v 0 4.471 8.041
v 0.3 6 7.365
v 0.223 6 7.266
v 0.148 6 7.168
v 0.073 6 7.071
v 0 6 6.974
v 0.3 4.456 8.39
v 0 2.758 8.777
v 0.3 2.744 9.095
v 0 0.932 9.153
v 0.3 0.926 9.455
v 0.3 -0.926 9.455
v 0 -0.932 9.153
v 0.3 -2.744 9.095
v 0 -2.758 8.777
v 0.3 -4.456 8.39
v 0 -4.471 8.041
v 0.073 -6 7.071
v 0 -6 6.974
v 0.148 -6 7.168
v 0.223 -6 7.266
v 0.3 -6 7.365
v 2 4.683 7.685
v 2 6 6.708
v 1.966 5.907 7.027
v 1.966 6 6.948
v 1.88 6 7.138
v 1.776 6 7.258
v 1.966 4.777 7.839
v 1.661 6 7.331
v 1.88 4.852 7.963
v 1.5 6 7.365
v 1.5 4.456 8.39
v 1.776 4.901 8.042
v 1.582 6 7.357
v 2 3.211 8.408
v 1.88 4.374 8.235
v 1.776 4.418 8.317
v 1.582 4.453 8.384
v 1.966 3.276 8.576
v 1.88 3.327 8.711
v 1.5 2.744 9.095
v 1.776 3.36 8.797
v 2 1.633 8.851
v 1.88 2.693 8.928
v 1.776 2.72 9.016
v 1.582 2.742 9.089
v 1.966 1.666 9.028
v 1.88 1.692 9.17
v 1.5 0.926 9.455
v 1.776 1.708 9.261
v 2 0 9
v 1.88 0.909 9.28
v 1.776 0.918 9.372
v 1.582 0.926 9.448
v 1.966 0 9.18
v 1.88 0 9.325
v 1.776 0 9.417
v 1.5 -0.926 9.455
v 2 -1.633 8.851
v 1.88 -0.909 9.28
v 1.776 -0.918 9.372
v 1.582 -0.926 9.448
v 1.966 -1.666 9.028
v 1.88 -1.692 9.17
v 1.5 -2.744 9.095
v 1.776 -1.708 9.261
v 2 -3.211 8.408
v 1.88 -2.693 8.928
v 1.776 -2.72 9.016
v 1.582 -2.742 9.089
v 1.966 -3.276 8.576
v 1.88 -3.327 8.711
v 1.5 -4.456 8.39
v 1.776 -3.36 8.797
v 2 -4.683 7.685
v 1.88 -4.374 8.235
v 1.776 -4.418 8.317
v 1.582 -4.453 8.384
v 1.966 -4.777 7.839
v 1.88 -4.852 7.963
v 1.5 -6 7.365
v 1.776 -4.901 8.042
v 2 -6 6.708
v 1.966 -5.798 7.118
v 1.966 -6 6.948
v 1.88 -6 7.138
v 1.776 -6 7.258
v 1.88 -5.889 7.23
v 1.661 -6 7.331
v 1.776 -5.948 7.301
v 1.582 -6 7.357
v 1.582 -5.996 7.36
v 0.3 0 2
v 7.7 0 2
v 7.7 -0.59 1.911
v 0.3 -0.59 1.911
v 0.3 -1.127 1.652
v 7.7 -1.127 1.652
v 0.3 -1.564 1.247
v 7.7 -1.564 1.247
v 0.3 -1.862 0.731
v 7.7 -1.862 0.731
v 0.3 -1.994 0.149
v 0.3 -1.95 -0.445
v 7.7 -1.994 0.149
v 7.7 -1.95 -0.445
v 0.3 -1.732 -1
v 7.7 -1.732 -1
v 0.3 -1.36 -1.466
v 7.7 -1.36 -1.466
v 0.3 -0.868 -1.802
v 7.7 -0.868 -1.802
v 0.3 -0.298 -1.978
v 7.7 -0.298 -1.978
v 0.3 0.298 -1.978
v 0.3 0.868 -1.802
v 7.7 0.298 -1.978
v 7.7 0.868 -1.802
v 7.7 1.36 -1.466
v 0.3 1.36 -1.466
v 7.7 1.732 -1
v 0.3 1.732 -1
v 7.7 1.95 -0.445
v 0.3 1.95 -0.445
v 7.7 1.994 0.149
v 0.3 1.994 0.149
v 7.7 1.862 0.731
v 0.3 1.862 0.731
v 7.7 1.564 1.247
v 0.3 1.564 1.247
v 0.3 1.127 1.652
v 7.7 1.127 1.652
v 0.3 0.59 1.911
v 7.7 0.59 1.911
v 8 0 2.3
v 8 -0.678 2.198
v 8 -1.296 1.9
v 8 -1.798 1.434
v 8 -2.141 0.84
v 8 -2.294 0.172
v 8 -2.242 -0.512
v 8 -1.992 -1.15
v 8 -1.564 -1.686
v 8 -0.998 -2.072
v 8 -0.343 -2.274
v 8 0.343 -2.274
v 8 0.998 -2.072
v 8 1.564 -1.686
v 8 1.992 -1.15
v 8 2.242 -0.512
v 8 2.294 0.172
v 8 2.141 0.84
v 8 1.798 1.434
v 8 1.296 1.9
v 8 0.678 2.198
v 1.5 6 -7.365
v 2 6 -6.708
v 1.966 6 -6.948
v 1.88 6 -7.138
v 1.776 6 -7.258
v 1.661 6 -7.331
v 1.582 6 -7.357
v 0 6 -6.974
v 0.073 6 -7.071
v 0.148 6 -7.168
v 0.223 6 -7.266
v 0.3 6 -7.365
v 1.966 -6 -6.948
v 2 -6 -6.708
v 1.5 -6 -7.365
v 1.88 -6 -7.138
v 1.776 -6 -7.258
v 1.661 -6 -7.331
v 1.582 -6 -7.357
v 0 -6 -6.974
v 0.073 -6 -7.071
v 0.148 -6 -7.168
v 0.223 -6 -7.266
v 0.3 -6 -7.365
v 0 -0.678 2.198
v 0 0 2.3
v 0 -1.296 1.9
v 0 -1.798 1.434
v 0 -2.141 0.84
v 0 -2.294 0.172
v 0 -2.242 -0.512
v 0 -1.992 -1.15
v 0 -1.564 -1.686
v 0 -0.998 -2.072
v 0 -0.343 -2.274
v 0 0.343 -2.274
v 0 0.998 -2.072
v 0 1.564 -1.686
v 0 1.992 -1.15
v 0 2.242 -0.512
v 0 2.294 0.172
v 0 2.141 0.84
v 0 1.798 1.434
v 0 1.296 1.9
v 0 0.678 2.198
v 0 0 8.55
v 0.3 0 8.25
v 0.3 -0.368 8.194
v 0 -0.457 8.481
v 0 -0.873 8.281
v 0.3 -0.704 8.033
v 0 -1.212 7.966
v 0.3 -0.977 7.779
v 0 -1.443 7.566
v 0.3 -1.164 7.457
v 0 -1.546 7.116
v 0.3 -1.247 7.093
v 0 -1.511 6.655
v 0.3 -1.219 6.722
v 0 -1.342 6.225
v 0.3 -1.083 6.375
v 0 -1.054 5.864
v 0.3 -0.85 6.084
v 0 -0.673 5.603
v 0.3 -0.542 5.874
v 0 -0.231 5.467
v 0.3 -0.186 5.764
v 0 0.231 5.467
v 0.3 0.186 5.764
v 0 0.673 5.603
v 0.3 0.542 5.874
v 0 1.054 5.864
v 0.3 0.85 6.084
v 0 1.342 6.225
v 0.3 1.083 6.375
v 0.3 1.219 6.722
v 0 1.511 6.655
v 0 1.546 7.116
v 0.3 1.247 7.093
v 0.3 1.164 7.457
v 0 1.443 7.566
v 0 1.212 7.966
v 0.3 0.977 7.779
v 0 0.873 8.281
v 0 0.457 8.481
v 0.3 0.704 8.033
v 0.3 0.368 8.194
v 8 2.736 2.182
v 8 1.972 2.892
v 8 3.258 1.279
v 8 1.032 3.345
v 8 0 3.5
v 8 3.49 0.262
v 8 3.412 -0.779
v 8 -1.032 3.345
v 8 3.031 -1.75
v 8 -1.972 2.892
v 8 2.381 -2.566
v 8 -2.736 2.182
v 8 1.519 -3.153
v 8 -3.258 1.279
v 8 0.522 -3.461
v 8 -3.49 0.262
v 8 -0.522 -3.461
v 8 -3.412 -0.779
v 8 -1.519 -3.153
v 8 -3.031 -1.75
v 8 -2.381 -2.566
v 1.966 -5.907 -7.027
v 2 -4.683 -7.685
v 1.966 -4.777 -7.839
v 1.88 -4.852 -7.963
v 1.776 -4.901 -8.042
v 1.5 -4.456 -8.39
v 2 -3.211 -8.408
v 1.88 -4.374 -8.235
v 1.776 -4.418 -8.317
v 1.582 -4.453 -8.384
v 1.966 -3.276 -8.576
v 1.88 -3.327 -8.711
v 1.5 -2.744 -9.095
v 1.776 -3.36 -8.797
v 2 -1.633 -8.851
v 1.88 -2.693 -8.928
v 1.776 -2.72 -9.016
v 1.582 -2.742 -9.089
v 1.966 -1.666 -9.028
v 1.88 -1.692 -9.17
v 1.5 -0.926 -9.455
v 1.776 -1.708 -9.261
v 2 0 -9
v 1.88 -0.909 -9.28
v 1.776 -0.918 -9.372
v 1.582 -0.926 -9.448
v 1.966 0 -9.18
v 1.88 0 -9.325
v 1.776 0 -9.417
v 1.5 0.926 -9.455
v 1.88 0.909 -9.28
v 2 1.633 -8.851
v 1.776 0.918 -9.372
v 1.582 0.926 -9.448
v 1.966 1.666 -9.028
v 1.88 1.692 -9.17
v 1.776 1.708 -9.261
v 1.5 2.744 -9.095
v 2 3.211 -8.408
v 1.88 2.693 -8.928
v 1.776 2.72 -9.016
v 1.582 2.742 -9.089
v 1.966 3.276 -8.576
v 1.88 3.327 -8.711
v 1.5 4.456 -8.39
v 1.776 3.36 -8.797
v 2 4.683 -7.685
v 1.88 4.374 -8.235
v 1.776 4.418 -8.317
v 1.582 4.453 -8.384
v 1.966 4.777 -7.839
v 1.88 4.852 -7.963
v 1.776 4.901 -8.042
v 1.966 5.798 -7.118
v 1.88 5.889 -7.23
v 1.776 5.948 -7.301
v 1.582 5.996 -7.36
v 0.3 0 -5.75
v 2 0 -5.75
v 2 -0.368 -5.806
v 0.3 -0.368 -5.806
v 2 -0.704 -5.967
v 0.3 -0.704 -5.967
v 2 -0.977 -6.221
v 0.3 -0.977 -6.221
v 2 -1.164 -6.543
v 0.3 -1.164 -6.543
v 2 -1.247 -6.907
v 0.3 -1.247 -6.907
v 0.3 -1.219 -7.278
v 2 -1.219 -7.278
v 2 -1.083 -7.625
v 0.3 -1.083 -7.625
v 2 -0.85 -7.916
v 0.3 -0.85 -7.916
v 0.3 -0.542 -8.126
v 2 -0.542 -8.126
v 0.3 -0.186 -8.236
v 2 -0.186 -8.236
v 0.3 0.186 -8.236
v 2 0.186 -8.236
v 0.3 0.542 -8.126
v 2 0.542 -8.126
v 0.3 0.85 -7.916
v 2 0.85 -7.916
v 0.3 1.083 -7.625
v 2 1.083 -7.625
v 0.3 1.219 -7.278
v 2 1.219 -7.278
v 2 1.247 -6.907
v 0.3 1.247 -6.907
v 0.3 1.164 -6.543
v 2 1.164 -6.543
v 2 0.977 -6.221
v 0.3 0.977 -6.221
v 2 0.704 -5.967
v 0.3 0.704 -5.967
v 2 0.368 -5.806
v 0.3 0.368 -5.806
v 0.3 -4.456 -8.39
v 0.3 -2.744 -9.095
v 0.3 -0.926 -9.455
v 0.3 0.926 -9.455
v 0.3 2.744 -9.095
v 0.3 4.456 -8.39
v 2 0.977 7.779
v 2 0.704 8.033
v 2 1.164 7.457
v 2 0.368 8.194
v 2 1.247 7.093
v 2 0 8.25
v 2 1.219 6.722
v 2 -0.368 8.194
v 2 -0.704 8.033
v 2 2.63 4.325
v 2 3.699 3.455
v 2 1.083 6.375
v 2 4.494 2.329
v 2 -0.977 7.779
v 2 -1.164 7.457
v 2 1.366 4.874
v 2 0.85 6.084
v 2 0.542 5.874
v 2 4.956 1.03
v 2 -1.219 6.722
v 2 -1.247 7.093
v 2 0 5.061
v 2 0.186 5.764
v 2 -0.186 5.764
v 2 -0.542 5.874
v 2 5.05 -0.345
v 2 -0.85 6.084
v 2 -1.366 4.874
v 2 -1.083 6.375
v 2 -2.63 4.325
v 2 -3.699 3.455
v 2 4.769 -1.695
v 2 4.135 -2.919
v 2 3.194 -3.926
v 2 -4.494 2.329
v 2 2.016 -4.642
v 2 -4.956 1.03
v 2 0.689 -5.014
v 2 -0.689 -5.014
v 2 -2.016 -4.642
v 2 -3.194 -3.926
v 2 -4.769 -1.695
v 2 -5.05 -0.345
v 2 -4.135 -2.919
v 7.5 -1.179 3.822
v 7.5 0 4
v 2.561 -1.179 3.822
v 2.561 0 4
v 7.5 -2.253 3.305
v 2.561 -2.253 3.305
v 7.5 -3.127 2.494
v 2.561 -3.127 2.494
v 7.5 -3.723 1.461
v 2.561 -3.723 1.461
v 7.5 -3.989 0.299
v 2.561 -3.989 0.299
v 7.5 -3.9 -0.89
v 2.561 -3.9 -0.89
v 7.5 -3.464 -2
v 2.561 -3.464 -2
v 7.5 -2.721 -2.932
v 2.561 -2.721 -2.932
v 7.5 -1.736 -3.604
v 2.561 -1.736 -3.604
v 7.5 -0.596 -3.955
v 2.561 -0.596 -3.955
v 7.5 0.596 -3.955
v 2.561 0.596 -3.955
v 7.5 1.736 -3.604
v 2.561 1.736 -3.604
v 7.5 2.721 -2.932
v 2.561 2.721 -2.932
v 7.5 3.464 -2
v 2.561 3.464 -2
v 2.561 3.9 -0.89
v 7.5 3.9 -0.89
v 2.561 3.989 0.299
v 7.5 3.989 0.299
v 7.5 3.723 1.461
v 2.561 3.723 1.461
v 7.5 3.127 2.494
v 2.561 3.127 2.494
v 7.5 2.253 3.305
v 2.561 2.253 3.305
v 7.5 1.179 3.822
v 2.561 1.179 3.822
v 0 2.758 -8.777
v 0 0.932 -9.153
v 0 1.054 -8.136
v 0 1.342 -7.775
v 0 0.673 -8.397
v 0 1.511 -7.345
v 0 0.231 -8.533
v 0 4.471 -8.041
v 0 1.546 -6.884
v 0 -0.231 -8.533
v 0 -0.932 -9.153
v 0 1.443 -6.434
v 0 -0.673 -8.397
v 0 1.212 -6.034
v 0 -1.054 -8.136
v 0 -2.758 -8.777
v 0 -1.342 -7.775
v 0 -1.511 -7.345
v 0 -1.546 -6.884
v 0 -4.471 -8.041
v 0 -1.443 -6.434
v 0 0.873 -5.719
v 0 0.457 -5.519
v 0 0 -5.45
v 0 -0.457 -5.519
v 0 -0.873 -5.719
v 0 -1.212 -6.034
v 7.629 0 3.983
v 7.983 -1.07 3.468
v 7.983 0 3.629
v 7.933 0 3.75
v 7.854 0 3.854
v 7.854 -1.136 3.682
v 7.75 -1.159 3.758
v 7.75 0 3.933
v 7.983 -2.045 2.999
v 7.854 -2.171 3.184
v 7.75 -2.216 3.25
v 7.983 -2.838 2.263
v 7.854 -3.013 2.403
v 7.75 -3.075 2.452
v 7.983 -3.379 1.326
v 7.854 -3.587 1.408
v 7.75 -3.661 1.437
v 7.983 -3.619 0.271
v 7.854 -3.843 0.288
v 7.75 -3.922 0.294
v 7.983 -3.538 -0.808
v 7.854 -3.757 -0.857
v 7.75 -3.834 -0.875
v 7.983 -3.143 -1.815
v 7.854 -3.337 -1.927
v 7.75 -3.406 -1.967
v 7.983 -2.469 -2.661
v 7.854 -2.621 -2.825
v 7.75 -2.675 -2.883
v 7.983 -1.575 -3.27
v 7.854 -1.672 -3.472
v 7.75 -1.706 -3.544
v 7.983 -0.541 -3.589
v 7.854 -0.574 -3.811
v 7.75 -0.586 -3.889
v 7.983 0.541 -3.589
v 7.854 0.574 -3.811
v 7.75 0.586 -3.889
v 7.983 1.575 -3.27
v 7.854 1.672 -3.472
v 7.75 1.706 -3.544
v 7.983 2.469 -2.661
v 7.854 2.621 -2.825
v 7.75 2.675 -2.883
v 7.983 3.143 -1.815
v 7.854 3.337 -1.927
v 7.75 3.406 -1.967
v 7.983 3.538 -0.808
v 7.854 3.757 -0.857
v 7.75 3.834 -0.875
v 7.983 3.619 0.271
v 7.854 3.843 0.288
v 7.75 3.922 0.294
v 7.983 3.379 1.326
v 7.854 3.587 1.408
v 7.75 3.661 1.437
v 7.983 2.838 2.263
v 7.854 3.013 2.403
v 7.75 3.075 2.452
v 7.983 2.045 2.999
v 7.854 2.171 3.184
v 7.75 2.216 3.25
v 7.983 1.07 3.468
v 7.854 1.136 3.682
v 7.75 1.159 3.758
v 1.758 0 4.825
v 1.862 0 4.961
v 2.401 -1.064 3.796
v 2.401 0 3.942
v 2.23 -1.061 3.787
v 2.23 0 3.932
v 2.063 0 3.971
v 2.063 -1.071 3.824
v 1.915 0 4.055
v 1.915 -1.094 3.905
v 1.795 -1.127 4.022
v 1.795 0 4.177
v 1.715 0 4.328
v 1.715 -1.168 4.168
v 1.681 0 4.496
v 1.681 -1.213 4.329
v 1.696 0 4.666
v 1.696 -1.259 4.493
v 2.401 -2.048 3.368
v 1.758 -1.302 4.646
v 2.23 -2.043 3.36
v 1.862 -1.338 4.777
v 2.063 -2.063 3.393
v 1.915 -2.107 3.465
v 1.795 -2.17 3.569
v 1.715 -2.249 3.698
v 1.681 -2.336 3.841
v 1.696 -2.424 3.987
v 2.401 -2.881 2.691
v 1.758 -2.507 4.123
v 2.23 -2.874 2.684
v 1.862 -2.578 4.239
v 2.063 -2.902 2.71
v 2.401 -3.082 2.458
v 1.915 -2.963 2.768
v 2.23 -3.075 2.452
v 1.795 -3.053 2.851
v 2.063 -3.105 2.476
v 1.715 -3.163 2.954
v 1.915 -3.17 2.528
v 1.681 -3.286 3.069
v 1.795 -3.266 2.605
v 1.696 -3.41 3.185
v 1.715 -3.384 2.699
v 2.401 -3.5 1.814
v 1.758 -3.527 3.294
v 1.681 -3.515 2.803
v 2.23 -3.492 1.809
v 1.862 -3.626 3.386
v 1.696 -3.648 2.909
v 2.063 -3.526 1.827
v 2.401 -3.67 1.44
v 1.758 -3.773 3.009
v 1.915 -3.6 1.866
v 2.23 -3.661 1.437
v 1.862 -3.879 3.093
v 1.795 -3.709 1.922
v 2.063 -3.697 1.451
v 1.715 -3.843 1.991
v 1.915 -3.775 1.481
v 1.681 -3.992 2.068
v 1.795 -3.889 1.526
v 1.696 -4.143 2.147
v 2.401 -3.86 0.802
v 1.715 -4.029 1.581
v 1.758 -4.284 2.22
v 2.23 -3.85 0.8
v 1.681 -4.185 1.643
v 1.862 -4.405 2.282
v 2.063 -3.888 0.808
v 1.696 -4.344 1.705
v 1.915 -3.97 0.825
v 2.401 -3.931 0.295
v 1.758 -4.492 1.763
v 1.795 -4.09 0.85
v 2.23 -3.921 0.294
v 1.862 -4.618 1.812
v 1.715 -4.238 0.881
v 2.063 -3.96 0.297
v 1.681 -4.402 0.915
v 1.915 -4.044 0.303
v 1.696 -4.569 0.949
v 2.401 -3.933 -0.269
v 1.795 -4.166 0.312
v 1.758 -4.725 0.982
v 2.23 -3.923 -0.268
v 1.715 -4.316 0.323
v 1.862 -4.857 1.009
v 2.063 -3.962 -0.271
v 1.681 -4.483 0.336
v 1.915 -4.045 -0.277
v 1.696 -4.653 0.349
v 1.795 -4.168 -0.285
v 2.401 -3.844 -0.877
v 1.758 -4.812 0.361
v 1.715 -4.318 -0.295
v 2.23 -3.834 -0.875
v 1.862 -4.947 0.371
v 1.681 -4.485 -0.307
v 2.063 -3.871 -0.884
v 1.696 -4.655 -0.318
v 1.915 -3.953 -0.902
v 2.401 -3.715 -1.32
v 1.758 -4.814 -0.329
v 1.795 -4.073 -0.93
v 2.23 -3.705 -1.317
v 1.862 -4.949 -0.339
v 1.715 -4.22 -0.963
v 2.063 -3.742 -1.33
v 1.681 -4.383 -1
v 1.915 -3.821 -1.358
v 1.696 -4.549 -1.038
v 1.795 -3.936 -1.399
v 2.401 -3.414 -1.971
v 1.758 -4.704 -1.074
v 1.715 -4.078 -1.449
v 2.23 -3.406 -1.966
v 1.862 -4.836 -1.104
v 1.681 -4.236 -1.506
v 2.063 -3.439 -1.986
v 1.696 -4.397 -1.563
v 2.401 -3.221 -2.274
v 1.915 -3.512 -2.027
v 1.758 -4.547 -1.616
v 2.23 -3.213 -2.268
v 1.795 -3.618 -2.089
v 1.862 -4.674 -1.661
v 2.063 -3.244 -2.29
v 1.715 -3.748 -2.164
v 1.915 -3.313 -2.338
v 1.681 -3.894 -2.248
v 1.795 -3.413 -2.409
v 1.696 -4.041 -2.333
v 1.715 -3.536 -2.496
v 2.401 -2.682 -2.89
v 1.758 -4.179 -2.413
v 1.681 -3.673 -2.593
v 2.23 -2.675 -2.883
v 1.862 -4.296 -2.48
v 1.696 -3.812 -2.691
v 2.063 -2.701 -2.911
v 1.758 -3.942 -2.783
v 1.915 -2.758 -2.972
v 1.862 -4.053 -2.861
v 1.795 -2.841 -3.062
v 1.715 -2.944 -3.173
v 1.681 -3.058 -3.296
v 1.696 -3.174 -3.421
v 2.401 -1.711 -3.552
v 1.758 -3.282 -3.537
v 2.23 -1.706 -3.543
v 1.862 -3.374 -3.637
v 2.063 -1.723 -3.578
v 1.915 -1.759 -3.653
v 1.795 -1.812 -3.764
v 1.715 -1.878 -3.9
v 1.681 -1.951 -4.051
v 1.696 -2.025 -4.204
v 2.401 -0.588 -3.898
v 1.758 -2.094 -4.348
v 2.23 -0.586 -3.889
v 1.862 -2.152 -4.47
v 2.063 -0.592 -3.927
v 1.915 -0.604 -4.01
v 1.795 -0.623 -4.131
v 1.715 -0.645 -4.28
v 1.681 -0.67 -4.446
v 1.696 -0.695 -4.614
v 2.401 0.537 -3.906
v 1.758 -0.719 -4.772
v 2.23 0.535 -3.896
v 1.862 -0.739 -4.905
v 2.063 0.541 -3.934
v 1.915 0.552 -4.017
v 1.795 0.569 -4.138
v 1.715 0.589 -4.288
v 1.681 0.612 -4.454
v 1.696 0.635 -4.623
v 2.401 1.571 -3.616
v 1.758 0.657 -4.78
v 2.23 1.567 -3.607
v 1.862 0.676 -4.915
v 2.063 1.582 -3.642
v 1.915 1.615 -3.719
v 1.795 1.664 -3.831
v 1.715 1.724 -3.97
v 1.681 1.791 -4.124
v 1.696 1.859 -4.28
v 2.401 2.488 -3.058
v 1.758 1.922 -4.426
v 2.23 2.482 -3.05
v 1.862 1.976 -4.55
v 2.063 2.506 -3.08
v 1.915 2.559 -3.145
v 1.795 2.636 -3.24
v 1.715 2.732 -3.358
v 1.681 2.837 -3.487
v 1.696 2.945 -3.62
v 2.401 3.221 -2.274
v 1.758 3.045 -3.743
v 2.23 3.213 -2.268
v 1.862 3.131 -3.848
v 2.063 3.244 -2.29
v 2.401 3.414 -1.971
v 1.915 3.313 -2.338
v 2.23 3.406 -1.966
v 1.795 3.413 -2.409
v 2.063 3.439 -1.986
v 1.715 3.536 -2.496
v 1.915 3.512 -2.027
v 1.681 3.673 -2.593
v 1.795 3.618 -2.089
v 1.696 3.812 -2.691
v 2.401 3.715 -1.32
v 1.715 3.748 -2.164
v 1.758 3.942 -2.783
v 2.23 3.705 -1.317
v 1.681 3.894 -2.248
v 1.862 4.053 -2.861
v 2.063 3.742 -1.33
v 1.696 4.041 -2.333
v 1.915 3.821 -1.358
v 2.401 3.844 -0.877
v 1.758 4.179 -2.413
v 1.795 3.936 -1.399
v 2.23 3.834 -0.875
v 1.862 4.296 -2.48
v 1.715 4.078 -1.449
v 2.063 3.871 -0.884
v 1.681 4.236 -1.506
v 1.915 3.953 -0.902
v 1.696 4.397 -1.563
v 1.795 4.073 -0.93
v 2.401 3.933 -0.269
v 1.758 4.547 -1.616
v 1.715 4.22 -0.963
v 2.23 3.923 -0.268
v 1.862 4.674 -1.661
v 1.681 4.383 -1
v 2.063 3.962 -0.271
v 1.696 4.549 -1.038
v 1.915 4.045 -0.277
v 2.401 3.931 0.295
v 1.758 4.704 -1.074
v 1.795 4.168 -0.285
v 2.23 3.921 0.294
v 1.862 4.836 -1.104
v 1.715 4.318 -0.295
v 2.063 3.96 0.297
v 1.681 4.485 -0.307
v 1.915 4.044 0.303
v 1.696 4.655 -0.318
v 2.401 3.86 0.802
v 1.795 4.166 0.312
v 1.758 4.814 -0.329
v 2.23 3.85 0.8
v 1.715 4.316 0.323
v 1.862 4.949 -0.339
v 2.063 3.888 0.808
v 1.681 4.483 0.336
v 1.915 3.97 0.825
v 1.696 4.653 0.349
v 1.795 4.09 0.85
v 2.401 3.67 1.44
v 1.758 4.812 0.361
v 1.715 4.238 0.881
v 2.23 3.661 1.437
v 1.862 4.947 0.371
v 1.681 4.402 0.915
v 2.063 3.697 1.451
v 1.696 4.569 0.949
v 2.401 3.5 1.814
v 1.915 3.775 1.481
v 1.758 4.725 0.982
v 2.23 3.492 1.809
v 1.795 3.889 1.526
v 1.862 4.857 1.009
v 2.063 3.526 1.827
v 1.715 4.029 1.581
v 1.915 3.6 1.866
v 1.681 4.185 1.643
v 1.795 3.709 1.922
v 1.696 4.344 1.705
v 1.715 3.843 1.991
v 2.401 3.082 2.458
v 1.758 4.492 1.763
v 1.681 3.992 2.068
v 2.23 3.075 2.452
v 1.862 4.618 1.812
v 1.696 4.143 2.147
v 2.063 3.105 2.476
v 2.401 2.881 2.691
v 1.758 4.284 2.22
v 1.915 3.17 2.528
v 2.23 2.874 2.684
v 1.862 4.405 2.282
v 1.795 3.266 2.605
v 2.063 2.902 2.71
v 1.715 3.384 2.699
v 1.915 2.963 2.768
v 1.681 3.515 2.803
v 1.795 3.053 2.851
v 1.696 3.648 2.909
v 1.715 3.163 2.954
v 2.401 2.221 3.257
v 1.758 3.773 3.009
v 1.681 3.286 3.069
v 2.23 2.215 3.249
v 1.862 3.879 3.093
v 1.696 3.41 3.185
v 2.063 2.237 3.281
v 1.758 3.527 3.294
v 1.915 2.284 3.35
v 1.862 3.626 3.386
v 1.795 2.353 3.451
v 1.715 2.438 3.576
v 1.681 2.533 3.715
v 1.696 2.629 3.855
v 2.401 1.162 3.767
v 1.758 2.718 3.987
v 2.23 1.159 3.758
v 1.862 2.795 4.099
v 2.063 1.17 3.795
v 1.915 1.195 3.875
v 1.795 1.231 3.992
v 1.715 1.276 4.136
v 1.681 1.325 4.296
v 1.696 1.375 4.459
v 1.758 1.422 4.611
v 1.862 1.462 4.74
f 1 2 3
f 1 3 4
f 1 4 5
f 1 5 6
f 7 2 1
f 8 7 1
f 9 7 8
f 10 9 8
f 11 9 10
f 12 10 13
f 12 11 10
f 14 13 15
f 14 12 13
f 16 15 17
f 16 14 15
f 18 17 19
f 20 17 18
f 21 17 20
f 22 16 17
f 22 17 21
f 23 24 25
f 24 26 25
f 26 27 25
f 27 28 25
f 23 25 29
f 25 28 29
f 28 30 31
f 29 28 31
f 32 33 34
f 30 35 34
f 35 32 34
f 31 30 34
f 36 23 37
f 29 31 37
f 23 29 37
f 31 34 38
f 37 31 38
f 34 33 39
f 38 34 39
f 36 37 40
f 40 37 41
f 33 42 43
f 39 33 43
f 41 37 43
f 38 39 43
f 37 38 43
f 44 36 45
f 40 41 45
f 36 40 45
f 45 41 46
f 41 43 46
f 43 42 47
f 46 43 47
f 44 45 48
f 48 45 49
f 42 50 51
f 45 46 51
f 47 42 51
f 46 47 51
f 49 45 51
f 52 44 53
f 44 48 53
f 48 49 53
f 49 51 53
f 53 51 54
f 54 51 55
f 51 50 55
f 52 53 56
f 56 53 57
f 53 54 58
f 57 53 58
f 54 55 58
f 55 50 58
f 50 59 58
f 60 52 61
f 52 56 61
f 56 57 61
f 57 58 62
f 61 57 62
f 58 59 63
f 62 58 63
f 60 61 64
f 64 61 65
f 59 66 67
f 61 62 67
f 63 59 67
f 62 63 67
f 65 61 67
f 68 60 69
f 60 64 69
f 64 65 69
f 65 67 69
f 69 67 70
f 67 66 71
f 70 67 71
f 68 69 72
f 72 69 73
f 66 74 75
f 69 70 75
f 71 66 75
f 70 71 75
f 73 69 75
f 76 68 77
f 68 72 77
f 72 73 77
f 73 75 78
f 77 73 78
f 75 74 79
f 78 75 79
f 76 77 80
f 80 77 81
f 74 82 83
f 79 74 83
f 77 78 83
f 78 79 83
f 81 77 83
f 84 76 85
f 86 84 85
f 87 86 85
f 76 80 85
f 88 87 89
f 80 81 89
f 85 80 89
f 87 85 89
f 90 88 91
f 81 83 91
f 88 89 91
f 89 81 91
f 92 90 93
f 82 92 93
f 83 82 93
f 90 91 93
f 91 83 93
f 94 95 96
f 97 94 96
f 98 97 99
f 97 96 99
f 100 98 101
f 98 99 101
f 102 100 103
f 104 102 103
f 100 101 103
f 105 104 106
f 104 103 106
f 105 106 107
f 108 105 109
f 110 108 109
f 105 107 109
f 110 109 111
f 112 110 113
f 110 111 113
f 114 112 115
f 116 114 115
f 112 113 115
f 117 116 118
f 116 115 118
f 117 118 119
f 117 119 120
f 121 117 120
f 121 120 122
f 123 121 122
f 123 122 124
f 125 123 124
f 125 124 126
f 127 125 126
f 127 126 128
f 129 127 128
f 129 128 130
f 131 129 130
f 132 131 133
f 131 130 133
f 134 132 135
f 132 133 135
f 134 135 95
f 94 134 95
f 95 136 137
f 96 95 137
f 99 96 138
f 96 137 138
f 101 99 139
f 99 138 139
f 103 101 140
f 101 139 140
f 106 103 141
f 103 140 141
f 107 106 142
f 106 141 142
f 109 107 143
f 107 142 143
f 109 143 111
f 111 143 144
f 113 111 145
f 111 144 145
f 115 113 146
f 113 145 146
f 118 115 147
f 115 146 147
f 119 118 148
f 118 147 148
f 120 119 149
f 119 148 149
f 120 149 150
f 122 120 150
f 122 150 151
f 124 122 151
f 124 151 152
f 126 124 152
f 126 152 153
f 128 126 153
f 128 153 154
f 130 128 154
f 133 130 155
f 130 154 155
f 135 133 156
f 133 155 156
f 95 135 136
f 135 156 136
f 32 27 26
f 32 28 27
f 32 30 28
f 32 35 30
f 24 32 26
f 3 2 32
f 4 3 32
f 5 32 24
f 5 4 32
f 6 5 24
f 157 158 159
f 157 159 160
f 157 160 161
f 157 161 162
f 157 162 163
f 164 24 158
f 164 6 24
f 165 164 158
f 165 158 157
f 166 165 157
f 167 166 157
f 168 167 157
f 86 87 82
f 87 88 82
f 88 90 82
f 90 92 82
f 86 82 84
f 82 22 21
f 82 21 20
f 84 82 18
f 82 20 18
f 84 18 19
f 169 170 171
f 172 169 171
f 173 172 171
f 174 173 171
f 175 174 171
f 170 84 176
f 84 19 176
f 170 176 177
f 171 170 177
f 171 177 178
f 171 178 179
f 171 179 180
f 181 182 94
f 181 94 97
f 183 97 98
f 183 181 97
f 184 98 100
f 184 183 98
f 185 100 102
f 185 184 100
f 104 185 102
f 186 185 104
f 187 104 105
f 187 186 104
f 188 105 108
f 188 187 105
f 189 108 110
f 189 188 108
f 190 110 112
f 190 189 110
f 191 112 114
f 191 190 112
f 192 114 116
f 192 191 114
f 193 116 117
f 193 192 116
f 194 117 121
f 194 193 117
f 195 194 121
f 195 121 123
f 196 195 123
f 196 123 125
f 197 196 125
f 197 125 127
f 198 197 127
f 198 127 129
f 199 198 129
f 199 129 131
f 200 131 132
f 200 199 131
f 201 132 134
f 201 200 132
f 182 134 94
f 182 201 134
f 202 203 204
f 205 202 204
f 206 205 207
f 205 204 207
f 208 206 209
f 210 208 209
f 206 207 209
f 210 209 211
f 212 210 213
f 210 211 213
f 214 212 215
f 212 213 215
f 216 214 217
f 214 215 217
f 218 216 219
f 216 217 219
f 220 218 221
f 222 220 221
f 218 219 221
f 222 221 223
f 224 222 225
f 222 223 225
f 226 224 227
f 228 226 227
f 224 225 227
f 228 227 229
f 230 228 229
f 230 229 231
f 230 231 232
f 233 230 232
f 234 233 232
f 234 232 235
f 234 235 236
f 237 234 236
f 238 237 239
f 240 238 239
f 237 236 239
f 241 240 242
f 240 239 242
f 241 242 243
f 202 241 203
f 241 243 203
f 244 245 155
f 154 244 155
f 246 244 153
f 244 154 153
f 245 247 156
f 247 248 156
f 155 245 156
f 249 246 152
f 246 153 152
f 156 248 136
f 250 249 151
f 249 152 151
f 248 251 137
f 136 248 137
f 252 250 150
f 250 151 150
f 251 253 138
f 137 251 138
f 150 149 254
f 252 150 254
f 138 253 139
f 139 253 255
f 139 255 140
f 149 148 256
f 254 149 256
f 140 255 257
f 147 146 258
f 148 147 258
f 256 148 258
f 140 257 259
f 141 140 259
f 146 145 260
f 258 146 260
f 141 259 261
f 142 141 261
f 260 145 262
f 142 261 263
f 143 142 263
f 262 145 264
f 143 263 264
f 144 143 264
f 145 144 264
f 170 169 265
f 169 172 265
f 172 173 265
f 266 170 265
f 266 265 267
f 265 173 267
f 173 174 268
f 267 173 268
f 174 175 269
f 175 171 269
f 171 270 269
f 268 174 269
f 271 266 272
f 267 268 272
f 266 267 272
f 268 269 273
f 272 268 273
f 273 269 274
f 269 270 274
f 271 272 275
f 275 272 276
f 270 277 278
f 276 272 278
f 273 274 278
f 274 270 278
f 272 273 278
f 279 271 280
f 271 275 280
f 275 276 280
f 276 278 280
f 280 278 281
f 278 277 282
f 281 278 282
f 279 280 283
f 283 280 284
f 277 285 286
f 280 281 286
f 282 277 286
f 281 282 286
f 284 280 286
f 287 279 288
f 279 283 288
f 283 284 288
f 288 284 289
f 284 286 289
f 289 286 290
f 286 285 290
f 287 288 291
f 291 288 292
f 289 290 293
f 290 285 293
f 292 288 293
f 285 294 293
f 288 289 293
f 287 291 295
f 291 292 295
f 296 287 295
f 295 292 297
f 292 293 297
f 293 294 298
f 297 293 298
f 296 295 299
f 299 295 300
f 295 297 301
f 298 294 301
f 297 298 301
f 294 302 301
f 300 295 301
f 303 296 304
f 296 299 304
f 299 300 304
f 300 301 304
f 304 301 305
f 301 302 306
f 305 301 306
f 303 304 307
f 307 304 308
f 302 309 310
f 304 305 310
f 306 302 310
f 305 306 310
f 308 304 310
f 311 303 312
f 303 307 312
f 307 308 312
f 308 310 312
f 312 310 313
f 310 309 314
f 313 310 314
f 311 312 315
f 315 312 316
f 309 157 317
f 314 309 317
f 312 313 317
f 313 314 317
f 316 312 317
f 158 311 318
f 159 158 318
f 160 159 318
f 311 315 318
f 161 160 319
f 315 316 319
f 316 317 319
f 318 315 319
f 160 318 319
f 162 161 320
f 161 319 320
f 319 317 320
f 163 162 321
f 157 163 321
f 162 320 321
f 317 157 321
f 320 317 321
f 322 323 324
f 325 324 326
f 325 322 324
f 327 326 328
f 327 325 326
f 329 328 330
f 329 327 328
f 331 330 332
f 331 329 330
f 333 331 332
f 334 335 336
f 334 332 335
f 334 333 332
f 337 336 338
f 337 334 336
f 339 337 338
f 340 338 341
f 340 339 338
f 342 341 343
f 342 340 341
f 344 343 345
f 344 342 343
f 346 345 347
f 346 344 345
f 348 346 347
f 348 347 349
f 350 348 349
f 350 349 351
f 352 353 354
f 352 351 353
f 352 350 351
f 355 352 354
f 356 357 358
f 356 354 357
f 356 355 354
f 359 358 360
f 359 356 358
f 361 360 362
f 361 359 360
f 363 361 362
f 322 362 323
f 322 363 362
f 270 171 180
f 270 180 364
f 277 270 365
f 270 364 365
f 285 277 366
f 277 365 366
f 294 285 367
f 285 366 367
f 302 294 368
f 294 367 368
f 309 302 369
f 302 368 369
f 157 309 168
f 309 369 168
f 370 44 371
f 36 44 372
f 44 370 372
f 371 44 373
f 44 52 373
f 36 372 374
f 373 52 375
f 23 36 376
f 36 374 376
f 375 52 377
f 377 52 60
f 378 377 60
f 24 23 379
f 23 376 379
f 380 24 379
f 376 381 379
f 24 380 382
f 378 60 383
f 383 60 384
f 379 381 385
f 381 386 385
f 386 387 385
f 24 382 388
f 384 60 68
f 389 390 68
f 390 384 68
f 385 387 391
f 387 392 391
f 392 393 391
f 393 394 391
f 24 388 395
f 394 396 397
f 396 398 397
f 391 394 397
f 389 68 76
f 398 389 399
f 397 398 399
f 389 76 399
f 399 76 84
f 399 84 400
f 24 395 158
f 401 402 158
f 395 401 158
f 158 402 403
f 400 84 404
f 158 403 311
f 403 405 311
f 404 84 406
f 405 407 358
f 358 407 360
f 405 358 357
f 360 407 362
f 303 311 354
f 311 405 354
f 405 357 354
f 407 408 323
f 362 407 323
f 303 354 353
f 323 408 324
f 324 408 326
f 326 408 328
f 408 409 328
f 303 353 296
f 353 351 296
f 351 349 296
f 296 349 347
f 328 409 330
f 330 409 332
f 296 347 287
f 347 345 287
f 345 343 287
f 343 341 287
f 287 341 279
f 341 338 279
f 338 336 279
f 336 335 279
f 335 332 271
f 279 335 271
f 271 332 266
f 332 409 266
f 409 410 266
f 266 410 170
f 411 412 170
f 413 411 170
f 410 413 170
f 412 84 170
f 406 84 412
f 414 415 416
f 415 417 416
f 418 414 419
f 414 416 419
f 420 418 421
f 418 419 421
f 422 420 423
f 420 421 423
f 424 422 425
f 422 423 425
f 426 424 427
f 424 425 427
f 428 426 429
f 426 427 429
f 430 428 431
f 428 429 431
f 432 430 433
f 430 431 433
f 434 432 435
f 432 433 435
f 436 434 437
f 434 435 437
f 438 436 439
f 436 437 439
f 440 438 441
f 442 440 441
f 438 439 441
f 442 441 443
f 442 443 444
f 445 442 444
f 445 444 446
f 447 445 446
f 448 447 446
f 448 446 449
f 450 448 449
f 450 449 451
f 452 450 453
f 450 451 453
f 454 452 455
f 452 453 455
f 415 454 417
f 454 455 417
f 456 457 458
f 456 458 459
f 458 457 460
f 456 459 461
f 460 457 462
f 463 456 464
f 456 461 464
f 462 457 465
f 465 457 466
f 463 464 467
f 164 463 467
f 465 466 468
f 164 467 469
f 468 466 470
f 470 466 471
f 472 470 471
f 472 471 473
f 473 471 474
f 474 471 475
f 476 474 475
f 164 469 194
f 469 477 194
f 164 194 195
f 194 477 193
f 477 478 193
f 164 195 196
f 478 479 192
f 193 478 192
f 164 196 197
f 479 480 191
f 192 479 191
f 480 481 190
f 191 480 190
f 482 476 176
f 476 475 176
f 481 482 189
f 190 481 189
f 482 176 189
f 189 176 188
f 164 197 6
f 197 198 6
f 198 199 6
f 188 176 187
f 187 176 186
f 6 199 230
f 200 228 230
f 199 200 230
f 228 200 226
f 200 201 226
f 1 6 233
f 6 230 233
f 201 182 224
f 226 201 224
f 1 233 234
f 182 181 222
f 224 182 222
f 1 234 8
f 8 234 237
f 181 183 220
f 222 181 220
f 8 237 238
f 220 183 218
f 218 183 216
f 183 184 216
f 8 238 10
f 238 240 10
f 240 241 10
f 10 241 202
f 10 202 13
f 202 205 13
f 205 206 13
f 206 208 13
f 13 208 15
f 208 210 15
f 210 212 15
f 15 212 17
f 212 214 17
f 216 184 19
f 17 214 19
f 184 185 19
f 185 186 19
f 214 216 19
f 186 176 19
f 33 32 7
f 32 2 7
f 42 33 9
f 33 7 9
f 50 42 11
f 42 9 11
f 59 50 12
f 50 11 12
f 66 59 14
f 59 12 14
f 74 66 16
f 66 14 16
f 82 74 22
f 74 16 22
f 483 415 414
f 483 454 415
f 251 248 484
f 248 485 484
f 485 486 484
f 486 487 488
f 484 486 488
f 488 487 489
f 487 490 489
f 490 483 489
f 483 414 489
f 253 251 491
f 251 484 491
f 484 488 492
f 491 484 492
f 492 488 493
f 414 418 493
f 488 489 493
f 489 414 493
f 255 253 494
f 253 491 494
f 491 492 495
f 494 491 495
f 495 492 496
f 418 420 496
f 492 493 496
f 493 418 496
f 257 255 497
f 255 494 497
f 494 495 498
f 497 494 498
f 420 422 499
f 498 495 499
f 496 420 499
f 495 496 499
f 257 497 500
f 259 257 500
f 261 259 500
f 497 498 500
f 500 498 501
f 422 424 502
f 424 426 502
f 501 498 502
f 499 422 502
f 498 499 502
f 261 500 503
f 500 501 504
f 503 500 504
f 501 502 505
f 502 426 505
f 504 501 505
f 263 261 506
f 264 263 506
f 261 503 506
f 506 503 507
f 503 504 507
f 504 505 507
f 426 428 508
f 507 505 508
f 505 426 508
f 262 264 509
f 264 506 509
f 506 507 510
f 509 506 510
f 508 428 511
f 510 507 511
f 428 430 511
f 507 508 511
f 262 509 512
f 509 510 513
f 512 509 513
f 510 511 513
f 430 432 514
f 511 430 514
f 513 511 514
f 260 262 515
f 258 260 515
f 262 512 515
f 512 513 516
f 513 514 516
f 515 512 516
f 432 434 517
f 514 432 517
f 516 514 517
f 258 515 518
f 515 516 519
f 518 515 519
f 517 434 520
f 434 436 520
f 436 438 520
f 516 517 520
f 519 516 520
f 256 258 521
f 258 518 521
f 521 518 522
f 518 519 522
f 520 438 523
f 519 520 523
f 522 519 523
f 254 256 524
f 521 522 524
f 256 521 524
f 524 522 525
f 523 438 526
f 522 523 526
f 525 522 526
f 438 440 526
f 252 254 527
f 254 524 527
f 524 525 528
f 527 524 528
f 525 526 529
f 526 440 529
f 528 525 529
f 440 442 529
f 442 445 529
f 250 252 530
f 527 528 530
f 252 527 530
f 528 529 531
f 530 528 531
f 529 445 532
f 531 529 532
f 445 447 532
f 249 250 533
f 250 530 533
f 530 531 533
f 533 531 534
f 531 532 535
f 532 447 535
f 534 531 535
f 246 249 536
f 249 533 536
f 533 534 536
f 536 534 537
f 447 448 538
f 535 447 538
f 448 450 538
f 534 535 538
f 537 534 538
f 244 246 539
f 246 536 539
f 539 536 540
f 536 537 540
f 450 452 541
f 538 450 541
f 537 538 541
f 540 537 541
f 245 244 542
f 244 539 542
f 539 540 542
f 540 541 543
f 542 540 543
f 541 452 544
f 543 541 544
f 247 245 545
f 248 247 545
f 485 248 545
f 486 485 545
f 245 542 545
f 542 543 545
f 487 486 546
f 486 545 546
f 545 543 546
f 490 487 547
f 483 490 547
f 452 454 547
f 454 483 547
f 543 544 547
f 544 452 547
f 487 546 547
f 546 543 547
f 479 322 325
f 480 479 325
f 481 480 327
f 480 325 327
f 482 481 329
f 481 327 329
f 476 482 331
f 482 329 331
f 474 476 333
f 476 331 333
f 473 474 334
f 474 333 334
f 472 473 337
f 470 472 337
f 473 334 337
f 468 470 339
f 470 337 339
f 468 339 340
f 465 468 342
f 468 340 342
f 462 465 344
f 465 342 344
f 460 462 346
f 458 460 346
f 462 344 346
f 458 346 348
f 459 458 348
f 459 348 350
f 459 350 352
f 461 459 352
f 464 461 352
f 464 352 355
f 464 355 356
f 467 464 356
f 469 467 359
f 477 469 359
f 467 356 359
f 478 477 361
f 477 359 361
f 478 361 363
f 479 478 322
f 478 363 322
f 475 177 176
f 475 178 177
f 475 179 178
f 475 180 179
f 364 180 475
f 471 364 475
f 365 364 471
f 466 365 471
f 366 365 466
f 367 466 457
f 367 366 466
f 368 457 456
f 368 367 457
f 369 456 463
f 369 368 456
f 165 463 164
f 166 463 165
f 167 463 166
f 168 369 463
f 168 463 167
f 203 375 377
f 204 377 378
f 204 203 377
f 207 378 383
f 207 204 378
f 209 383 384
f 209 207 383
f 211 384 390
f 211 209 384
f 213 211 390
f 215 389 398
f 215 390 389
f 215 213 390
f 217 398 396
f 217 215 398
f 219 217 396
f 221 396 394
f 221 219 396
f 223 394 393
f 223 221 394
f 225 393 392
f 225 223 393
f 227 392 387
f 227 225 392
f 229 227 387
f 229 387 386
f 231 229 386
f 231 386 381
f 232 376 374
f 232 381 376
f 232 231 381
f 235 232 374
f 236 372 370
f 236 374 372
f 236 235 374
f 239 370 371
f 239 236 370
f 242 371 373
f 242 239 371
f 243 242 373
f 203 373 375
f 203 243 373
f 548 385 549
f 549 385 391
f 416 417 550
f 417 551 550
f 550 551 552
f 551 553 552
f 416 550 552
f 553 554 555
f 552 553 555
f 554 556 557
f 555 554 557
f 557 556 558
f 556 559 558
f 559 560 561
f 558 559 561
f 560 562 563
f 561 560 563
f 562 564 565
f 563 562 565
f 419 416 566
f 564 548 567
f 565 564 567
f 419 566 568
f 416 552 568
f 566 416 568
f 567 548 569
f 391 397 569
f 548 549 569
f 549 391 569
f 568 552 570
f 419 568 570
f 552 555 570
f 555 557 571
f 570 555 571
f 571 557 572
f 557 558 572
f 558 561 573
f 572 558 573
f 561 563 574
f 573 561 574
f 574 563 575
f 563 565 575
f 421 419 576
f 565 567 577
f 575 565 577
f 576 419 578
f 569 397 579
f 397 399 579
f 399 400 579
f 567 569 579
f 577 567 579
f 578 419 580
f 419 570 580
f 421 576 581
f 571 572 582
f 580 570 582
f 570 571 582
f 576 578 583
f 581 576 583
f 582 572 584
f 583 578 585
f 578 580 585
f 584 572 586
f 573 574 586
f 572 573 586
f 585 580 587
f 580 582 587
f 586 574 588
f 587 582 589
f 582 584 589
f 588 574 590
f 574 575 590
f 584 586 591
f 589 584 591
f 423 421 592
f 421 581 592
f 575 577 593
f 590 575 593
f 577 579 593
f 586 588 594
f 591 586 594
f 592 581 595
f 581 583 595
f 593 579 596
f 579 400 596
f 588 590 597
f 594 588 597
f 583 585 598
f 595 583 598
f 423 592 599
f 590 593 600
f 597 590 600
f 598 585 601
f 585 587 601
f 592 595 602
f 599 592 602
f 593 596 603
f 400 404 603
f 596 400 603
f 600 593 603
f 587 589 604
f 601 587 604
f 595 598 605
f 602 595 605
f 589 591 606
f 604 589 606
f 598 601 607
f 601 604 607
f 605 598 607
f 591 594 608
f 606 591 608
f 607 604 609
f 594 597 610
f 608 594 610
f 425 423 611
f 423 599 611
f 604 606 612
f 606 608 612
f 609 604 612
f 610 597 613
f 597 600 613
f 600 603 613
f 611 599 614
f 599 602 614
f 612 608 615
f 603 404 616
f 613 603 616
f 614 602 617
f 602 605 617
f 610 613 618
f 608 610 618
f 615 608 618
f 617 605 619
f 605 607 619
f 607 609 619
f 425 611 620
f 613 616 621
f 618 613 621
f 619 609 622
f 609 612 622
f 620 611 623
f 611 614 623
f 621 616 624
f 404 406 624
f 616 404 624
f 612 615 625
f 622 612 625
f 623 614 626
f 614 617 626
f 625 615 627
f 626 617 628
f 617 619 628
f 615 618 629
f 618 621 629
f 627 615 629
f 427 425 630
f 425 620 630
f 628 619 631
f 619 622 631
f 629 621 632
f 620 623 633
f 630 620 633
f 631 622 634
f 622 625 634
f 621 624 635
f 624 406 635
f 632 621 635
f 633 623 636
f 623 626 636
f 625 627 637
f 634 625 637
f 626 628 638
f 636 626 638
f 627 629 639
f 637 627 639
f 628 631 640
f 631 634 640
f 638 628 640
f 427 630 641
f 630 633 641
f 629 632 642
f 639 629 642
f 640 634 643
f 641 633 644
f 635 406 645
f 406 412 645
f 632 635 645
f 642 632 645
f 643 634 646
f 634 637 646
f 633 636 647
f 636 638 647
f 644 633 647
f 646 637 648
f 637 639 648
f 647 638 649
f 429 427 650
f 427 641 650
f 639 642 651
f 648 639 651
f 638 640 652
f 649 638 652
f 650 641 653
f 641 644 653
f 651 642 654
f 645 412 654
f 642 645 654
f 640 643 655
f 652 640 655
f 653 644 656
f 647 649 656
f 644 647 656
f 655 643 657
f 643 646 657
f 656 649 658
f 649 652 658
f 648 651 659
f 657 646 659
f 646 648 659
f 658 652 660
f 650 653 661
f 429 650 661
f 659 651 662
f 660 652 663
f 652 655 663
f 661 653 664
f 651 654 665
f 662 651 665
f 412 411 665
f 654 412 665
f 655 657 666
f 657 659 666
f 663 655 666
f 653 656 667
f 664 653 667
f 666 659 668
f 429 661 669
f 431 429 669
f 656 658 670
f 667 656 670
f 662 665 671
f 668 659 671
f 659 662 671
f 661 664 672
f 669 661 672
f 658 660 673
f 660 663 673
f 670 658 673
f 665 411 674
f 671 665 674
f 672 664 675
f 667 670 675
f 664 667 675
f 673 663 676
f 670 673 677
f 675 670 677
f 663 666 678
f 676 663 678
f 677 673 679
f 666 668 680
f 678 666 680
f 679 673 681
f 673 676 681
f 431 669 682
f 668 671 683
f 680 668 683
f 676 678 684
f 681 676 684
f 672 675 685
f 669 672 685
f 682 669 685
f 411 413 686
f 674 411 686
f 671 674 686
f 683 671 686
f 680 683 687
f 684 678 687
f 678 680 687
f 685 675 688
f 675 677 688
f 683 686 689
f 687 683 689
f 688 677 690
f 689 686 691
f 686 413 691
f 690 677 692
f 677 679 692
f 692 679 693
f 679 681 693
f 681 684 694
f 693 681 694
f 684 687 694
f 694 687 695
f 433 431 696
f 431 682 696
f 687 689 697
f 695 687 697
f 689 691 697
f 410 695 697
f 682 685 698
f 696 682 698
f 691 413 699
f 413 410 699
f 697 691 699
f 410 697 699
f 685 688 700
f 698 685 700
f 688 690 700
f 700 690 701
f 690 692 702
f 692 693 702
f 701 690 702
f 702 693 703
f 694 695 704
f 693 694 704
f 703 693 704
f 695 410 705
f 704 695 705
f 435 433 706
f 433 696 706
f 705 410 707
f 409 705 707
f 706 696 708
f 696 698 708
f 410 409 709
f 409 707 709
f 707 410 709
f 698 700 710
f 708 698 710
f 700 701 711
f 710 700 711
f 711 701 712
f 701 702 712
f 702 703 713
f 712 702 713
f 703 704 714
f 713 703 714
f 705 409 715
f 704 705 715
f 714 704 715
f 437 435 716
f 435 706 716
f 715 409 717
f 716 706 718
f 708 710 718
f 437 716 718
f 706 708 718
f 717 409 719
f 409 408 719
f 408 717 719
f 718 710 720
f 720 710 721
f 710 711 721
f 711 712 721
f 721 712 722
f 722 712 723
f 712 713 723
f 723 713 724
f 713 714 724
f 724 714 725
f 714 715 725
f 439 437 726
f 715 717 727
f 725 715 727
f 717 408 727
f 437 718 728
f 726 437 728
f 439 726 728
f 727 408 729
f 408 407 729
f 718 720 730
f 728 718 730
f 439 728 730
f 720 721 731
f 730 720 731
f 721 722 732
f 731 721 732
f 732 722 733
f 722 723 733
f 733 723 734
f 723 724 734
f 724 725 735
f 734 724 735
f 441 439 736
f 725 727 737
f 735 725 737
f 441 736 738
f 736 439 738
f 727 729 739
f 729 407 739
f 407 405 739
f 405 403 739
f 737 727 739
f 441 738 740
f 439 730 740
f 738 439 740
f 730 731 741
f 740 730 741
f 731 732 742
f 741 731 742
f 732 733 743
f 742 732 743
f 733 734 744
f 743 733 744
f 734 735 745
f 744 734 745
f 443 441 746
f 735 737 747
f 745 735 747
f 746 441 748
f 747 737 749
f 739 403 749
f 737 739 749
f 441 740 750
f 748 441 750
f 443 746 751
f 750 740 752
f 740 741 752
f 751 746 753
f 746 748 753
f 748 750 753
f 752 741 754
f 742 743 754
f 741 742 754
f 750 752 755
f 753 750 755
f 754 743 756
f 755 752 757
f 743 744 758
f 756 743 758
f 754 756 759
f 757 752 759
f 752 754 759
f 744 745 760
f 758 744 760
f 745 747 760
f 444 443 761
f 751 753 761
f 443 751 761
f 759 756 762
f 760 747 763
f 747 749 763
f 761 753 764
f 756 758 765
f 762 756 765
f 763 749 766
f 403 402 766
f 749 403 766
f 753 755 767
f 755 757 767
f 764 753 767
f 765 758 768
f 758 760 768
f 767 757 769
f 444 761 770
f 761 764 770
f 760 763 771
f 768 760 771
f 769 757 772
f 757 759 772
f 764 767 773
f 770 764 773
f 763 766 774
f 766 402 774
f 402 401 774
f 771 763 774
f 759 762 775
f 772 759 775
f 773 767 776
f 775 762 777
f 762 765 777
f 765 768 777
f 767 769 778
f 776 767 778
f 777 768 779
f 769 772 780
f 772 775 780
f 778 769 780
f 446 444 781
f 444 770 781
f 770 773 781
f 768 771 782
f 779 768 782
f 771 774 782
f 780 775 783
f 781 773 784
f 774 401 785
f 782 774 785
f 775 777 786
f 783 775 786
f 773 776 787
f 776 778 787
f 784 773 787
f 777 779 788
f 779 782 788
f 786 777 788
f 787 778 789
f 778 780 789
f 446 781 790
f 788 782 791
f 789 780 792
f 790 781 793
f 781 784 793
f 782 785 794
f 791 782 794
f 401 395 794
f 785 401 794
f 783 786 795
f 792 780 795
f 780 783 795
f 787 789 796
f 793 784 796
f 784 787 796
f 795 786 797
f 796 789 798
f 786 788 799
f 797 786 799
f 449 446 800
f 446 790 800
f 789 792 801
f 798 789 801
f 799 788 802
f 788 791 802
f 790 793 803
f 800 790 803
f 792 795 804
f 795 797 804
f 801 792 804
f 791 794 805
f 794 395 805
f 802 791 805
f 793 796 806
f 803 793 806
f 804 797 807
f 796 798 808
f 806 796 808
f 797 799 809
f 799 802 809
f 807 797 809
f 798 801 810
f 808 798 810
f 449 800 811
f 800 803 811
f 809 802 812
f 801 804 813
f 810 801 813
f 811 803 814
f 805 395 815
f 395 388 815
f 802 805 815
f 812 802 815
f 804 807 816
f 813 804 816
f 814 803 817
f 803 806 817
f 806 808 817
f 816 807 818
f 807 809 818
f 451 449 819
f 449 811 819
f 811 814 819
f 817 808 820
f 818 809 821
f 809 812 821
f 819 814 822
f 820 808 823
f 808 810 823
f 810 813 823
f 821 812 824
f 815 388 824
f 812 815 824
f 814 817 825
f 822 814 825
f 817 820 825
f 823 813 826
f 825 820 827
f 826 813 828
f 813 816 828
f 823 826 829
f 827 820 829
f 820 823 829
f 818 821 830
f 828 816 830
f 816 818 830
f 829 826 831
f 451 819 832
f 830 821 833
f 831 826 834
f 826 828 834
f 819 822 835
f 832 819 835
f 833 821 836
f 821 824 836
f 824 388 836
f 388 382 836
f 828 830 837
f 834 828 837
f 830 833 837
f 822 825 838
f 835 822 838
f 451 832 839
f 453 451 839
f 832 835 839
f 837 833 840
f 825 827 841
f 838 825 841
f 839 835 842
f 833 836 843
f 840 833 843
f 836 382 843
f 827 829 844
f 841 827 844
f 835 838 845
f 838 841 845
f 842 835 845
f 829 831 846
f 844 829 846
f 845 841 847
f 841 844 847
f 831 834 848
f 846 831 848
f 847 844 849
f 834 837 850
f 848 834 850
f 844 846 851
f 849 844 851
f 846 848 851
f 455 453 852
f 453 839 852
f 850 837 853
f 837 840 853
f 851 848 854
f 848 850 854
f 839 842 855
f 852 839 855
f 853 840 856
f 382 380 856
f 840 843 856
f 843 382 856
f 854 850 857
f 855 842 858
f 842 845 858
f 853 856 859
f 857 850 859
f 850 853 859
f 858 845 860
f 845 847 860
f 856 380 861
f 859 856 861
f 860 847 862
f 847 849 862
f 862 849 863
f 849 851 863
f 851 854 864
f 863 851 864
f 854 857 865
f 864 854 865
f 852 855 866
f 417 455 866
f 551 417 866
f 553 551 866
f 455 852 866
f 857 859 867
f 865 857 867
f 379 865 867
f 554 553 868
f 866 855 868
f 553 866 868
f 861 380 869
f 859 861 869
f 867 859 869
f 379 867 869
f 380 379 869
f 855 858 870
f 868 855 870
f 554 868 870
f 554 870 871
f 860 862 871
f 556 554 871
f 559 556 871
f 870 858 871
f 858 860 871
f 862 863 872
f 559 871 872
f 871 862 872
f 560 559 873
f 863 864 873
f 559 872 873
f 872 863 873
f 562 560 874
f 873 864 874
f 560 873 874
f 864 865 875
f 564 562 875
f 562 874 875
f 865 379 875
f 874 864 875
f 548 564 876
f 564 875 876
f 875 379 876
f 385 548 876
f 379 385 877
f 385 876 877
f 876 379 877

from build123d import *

# Parameters (mm, degrees)
TROU_TARAUD_M3X0_51_AT_2_COUNT = 2
TROU_TARAUD_M3X0_51_AT_2_PITCH = 14
CHANFREIN1_SIZE                = 0.3
ESQUISSE7_W                    = 26.326678726
ESQUISSE7_H                    = 21.946612952
ESQUISSE7_W_2                  = 20
ESQUISSE7_H_2                  = 12
ENL_V_MAT_EXTRU_2_DEPTH        = 10


with BuildPart() as part:
    # Esquisse1 → Révolution1 (revolve)
    with BuildSketch(Plane.XY, mode=Mode.PRIVATE) as r_volution1_sk:
        with BuildLine():
            Line((0, 2), (8, 2))
            Line((8, 2), (8, 3.5))
            ThreePointArc((8, 3.5), (7.853553391, 3.853553391), (7.5, 4))
            Line((7.5, 4), (2.561460361, 4))
            ThreePointArc((2.561460361, 4), (1.75, 4.25), (2, 5.061460361))
            Line((2, 5.061460361), (2, 9))
            ThreePointArc((2, 9), (1.853553391, 9.353553391), (1.5, 9.5))
            Line((1.5, 9.5), (0, 9.5))
            Line((0, 9.5), (0, 2))
        make_face()
    revolve(r_volution1_sk.sketch.rotate(Axis((0, 0, 0), (1, 0, 0)), 90), axis=Axis((0, 0, 0), (1, 0, 0)))

    # Esquisse2 → Trou taraudé M3x0.51 (revolve, cut)
    with BuildSketch(Plane(origin=(0, 0, -7), x_dir=(0, 0, 1), z_dir=(0, 1, 0))):
        Polygon((0, 0), (0, 8), (1.6, 8), (1.25, 7.65), (1.25, 0), align=None)
    trou_taraud_m3x0_51 = revolve(axis=Axis((-6.35, 0, -7), (1, 0, 0)), mode=Mode.SUBTRACT)

    # Trou taraudé M3x0.51 at 2: Trou taraudé M3x0.51 ×2
    with Locations(*[(0, 0, i * TROU_TARAUD_M3X0_51_AT_2_PITCH) for i in range(1, TROU_TARAUD_M3X0_51_AT_2_COUNT)]):
        add(trou_taraud_m3x0_51, mode=Mode.SUBTRACT)

    # Chanfrein1
    chanfrein1_edges = [part.edges().sort_by_distance(p)[0] for p in [
        (0, 0, -2),
        (0, 0, 5.75),
        (0, 0, -8.25),
        (0, 0, -9.5),
        (8, 0, -2),
    ]]
    chamfer(chanfrein1_edges, length=CHANFREIN1_SIZE)

    # Esquisse7 → Enlèv. mat.-Extru.2 (cut)
    with BuildSketch(Plane(origin=(0, 0, 0), x_dir=(0, 0, -1), z_dir=(1, 0, 0))):
        Rectangle(ESQUISSE7_W, ESQUISSE7_H)
        Rectangle(ESQUISSE7_W_2, ESQUISSE7_H_2, mode=Mode.SUBTRACT)
    extrude(amount=ENL_V_MAT_EXTRU_2_DEPTH, mode=Mode.SUBTRACT)


solid = part.part
